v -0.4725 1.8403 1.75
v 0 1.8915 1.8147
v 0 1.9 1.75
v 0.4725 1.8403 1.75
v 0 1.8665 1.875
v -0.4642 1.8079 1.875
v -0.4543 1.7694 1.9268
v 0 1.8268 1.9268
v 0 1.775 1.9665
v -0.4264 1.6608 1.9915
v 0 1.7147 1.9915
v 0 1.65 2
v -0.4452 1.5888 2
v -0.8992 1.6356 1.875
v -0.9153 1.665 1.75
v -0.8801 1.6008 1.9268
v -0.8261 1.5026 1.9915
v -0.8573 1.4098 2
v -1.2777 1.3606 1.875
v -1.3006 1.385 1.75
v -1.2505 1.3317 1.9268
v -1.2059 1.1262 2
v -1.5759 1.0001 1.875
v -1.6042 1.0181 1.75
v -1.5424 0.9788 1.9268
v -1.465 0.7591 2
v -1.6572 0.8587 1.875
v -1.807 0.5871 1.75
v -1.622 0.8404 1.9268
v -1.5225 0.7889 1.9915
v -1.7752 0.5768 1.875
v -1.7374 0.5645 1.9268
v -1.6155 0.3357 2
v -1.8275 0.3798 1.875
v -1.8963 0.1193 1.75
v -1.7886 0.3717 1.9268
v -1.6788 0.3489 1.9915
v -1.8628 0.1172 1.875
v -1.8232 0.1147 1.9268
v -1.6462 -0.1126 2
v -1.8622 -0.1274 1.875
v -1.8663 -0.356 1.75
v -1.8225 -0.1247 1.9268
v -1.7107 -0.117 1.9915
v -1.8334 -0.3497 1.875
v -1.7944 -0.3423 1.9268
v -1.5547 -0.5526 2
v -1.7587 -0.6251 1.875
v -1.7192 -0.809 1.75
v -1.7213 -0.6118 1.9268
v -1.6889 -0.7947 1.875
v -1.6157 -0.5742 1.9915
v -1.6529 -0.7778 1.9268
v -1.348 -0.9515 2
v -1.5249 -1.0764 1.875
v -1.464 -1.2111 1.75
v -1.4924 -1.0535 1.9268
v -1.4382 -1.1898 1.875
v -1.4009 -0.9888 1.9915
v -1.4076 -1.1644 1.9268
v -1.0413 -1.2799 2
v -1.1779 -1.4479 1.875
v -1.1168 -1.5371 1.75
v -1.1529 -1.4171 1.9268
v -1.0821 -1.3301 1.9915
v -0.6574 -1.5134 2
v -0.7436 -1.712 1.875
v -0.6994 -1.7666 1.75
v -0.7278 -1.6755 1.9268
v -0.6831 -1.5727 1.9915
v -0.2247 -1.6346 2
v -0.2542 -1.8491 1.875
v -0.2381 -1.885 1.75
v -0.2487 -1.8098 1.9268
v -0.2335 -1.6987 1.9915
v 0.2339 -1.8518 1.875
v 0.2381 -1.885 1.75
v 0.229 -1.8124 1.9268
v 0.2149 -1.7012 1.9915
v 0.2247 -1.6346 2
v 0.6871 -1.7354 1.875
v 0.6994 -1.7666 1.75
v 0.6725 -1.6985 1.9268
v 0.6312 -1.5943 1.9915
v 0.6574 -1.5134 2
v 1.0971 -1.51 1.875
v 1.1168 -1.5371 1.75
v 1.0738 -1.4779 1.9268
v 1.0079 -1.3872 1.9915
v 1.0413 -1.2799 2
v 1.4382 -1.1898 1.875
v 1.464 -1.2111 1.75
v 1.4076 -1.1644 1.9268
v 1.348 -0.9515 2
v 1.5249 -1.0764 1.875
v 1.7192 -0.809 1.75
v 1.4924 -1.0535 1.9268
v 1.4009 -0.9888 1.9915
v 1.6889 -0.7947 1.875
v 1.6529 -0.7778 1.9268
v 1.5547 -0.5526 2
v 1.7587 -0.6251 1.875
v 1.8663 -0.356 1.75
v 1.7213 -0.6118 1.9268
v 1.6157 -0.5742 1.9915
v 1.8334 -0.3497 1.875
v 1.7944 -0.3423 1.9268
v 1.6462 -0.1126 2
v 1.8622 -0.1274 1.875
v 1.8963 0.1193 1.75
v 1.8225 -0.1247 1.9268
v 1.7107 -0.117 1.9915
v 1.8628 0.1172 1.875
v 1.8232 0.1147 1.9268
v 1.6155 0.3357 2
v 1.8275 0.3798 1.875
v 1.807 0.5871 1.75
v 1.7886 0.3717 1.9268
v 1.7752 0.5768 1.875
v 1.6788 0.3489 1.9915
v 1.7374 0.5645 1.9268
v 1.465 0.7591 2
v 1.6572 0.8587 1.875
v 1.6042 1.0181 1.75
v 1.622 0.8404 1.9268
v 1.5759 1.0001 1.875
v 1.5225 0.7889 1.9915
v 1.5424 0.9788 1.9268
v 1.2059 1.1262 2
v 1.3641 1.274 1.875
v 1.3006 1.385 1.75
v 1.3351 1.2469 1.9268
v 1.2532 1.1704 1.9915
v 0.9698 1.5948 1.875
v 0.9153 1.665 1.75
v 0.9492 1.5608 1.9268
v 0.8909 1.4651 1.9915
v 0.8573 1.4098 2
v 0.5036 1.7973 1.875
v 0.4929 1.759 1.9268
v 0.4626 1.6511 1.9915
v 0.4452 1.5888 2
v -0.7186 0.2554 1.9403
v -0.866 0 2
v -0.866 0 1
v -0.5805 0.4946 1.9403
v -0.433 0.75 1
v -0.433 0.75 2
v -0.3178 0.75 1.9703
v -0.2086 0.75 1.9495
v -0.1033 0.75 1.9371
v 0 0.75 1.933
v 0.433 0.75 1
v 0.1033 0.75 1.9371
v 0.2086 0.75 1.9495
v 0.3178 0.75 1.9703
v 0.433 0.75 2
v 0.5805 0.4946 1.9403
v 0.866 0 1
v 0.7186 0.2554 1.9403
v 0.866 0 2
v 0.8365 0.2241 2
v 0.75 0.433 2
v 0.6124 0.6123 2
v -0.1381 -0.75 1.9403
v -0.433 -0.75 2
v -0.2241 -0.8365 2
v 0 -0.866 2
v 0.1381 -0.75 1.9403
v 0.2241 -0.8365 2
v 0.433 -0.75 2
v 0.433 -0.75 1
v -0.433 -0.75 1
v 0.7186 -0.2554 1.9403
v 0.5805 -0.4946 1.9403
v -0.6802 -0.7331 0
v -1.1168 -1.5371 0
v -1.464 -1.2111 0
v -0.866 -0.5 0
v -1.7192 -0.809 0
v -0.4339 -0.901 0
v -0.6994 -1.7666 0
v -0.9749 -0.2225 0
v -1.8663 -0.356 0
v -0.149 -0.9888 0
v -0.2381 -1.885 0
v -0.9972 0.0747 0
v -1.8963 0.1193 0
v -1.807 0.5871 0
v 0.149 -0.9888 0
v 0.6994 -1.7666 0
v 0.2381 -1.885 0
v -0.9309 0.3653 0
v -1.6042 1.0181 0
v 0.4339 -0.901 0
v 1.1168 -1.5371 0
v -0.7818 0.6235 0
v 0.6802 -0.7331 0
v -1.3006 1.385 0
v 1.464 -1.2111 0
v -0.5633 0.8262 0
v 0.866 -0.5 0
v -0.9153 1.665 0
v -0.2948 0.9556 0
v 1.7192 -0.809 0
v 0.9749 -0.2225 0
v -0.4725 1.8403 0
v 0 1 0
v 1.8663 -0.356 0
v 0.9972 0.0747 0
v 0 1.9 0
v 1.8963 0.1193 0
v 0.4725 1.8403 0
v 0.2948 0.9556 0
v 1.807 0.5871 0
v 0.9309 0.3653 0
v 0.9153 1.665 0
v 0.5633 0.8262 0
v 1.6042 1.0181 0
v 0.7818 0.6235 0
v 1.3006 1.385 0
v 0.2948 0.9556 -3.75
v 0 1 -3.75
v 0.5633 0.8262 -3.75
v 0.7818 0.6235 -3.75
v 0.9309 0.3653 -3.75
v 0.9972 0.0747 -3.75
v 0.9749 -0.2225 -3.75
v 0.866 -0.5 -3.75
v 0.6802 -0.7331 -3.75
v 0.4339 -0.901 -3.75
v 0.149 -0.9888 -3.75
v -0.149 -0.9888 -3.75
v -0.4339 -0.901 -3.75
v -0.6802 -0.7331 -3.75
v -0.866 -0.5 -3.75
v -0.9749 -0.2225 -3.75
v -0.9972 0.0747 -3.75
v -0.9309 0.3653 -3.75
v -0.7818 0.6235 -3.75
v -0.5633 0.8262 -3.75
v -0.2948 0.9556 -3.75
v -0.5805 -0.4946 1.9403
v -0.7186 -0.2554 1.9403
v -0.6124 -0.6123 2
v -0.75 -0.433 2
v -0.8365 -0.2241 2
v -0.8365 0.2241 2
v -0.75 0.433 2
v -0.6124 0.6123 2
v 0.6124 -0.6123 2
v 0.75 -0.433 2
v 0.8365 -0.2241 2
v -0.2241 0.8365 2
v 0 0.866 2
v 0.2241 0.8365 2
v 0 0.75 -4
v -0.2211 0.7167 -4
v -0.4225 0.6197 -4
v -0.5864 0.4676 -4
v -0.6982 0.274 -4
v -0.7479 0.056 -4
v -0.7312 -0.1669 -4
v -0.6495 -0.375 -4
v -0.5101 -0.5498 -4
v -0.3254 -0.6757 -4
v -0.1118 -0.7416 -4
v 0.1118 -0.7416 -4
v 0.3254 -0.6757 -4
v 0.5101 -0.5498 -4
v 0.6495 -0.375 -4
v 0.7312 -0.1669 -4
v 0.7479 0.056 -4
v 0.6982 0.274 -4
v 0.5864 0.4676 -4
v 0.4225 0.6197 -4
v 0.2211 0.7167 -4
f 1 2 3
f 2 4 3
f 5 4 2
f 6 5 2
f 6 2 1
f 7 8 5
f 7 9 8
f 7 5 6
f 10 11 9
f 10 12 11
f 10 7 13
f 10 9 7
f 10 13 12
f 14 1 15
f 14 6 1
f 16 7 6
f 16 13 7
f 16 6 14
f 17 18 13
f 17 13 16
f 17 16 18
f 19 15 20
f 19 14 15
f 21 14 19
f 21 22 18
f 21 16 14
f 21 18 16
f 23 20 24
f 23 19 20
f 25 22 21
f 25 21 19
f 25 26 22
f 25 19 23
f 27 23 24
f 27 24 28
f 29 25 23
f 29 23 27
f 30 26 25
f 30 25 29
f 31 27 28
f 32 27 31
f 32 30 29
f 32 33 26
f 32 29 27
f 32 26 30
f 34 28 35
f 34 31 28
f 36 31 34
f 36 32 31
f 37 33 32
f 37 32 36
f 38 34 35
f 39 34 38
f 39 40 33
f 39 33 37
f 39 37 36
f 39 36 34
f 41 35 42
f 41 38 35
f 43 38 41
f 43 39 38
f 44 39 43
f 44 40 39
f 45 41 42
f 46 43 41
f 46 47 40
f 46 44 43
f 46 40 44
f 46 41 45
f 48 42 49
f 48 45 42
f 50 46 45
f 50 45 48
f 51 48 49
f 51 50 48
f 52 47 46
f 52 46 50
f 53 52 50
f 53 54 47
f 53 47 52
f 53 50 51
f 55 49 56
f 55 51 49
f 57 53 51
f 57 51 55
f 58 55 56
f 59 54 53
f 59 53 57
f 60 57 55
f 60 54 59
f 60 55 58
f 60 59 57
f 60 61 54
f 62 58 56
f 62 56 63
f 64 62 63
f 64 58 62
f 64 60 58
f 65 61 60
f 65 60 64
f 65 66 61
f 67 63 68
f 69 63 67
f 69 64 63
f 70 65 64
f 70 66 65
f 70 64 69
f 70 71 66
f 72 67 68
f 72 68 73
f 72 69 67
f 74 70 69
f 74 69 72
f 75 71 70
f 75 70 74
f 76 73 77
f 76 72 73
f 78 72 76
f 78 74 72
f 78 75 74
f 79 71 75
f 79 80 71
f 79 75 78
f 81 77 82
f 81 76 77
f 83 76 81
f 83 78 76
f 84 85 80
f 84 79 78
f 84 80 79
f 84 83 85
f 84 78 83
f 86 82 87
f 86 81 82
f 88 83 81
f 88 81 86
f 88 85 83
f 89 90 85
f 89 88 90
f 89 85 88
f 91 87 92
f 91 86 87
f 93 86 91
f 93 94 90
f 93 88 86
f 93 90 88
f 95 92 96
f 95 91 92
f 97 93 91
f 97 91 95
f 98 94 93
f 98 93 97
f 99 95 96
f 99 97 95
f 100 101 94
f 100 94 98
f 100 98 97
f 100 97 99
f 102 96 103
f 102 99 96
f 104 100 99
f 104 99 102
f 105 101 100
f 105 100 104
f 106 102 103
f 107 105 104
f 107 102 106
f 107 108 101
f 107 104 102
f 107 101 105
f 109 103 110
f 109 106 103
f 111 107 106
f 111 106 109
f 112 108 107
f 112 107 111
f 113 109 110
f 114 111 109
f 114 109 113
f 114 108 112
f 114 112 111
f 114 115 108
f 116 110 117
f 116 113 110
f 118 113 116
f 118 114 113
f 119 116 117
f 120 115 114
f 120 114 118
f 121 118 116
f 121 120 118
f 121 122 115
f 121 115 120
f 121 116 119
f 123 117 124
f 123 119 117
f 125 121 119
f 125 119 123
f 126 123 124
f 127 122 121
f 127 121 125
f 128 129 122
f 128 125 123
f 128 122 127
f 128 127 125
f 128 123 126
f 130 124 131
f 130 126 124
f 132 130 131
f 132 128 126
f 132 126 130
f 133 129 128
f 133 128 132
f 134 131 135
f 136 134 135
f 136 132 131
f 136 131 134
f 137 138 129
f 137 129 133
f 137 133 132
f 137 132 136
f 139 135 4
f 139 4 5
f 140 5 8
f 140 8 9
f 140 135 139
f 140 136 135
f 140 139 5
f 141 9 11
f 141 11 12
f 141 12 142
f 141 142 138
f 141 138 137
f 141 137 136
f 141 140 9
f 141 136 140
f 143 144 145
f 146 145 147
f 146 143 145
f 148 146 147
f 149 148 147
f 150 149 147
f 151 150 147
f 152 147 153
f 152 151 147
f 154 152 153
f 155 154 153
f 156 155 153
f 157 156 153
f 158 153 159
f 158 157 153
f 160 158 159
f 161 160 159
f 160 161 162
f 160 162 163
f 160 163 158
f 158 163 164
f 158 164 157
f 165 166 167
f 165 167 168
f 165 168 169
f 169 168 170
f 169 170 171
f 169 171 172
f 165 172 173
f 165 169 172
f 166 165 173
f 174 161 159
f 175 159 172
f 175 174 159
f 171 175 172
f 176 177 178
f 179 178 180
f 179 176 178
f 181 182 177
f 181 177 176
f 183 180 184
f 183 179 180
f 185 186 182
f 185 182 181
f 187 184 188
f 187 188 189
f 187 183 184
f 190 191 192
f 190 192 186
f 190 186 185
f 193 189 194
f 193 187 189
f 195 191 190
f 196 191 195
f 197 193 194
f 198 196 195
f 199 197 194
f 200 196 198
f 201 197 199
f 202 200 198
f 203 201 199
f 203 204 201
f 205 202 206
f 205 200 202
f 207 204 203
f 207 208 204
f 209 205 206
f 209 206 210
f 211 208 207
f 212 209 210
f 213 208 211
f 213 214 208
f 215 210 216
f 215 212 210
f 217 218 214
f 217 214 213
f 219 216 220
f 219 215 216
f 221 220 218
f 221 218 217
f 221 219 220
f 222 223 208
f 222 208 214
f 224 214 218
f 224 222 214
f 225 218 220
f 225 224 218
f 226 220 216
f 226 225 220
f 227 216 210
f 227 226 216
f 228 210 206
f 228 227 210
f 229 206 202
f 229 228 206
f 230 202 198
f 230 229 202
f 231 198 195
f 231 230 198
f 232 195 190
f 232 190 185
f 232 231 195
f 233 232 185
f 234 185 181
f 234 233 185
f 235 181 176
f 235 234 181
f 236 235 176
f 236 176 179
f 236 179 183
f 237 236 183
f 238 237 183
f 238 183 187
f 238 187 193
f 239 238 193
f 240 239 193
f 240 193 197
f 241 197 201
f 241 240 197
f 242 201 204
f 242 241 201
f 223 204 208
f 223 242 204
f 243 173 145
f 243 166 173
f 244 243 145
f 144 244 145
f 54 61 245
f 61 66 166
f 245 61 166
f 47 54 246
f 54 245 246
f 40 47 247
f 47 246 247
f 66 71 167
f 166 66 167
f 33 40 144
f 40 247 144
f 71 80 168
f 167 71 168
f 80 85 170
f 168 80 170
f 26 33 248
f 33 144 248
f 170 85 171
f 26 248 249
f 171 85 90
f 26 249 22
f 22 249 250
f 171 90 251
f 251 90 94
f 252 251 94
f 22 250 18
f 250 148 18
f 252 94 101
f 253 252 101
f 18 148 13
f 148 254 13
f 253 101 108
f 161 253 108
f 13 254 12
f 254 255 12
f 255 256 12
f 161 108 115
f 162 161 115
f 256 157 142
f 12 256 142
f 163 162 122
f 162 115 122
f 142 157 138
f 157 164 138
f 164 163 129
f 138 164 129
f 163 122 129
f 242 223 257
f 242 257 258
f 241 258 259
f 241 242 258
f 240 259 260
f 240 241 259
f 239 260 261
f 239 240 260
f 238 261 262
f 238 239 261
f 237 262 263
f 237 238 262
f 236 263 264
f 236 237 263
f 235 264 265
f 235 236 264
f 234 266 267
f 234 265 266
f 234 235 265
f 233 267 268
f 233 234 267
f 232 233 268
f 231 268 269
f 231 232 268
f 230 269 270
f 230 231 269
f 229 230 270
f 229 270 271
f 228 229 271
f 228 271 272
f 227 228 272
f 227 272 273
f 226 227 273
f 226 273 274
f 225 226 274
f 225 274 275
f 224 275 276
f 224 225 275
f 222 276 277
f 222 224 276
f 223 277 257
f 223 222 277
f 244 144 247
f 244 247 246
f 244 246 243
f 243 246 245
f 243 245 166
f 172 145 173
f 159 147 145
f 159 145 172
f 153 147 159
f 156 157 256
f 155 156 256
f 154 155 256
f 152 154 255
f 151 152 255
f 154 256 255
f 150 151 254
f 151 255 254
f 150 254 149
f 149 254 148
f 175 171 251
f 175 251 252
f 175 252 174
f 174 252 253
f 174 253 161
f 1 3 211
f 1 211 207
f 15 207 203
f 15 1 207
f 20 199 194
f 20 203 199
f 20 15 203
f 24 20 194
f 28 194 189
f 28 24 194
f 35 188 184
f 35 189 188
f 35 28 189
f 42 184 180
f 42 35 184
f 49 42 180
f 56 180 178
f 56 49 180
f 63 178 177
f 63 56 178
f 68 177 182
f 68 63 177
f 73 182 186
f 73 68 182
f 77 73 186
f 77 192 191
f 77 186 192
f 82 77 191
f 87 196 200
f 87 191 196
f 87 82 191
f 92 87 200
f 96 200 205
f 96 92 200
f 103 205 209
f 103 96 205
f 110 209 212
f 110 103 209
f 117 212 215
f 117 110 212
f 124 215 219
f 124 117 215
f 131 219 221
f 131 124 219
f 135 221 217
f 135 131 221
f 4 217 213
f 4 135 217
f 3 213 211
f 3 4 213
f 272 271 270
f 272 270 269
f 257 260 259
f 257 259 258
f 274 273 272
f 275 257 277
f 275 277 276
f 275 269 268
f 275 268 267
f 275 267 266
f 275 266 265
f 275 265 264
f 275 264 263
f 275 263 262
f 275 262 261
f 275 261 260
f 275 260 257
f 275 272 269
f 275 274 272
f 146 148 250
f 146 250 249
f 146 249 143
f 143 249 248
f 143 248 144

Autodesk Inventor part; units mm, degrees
ref_plane "YZ Plane" through (0, 0, 0) normal (1, 0, 0) x (0, 1, 0)
ref_plane "XZ Plane" through (0, 0, 0) normal (0, 1, 0) x (-1, 0, 0)
ref_plane "XY Plane" through (0, 0, 0) normal (0, 0, 1) x (1, 0, 0)
sketch "スケッチ1" plane through (0, 0, 0) normal (1, 0, 0) x (0, 1, 0)
  line L0 (0, 0) -> (1, 0) construction
  line L1 (1.9, 0) -> (1.9, 1.75)
  line L2 (1.65, 2) -> (0.866, 2)
  line L3 (0, 2) -> (0, 1.5) construction
  line L4 (1, 0) -> (1, -4)
  line L5 (1, -4) -> (0, -4)
  line L6 (0, -4) -> (0, 0)
  line L7 (1, 0) -> (1.9, 0)
  line L8 (0.866, 2) -> (0.433, 1.25) construction
  line L9 (0.433, 1.25) -> (-0.433, 1.25) construction
  line L10 (-0.433, 1.25) -> (-0.866, 2) construction
  line L11 (-0.866, 2) -> (-0.433, 2.75) construction
  line L12 (-0.433, 2.75) -> (0.433, 2.75) construction
  line L13 (0.433, 2.75) -> (0.866, 2) construction
  line L14 (0.866, 2) -> (0, 1.5)
  line L15 (0.866, 2) -> (0, 2) construction
  line L16 (0, 1.5) -> (0, 0)
  arc A0 (1.9, 1.75) -> (1.65, 2) centre (1.65, 1.75) ccw
  dimension "d0" = 1.5
  dimension "d1" = 3.8
  dimension "d2" = 2
  dimension "d3" = 4
  dimension "d4" = 2
  dimension "d6" = 0.25
  dimension "d11" = 30
revolve "回転1" add sketch "スケッチ1" angle 360 about axis through (0, 0, 1.5) along (0, 0, -1)
sketch "スケッチ2" plane through (0, 0, 2) normal (0, 0, 1) x (1, 0, 0)
  line L0 (0.866, 0) -> (0.433, -0.75)
  line L1 (0.433, -0.75) -> (-0.433, -0.75)
  line L2 (-0.433, -0.75) -> (-0.866, 0)
  line L3 (-0.866, 0) -> (-0.433, 0.75)
  line L4 (-0.433, 0.75) -> (0.433, 0.75)
  line L5 (0.433, 0.75) -> (0.866, 0)
  point P0 (0, 0)
  point P1 (0, 0)
  dimension "d8" = 1.5
extrude "押し出し1" cut sketch "スケッチ2" against normal blind 1
chamfer "面取り1" distance 0.25 angle 45 1 edges at (0, -1, -4)
properties part number "10_048_CAP_SCREW_M2X4_R1" material "鋼、炭素鋼"
